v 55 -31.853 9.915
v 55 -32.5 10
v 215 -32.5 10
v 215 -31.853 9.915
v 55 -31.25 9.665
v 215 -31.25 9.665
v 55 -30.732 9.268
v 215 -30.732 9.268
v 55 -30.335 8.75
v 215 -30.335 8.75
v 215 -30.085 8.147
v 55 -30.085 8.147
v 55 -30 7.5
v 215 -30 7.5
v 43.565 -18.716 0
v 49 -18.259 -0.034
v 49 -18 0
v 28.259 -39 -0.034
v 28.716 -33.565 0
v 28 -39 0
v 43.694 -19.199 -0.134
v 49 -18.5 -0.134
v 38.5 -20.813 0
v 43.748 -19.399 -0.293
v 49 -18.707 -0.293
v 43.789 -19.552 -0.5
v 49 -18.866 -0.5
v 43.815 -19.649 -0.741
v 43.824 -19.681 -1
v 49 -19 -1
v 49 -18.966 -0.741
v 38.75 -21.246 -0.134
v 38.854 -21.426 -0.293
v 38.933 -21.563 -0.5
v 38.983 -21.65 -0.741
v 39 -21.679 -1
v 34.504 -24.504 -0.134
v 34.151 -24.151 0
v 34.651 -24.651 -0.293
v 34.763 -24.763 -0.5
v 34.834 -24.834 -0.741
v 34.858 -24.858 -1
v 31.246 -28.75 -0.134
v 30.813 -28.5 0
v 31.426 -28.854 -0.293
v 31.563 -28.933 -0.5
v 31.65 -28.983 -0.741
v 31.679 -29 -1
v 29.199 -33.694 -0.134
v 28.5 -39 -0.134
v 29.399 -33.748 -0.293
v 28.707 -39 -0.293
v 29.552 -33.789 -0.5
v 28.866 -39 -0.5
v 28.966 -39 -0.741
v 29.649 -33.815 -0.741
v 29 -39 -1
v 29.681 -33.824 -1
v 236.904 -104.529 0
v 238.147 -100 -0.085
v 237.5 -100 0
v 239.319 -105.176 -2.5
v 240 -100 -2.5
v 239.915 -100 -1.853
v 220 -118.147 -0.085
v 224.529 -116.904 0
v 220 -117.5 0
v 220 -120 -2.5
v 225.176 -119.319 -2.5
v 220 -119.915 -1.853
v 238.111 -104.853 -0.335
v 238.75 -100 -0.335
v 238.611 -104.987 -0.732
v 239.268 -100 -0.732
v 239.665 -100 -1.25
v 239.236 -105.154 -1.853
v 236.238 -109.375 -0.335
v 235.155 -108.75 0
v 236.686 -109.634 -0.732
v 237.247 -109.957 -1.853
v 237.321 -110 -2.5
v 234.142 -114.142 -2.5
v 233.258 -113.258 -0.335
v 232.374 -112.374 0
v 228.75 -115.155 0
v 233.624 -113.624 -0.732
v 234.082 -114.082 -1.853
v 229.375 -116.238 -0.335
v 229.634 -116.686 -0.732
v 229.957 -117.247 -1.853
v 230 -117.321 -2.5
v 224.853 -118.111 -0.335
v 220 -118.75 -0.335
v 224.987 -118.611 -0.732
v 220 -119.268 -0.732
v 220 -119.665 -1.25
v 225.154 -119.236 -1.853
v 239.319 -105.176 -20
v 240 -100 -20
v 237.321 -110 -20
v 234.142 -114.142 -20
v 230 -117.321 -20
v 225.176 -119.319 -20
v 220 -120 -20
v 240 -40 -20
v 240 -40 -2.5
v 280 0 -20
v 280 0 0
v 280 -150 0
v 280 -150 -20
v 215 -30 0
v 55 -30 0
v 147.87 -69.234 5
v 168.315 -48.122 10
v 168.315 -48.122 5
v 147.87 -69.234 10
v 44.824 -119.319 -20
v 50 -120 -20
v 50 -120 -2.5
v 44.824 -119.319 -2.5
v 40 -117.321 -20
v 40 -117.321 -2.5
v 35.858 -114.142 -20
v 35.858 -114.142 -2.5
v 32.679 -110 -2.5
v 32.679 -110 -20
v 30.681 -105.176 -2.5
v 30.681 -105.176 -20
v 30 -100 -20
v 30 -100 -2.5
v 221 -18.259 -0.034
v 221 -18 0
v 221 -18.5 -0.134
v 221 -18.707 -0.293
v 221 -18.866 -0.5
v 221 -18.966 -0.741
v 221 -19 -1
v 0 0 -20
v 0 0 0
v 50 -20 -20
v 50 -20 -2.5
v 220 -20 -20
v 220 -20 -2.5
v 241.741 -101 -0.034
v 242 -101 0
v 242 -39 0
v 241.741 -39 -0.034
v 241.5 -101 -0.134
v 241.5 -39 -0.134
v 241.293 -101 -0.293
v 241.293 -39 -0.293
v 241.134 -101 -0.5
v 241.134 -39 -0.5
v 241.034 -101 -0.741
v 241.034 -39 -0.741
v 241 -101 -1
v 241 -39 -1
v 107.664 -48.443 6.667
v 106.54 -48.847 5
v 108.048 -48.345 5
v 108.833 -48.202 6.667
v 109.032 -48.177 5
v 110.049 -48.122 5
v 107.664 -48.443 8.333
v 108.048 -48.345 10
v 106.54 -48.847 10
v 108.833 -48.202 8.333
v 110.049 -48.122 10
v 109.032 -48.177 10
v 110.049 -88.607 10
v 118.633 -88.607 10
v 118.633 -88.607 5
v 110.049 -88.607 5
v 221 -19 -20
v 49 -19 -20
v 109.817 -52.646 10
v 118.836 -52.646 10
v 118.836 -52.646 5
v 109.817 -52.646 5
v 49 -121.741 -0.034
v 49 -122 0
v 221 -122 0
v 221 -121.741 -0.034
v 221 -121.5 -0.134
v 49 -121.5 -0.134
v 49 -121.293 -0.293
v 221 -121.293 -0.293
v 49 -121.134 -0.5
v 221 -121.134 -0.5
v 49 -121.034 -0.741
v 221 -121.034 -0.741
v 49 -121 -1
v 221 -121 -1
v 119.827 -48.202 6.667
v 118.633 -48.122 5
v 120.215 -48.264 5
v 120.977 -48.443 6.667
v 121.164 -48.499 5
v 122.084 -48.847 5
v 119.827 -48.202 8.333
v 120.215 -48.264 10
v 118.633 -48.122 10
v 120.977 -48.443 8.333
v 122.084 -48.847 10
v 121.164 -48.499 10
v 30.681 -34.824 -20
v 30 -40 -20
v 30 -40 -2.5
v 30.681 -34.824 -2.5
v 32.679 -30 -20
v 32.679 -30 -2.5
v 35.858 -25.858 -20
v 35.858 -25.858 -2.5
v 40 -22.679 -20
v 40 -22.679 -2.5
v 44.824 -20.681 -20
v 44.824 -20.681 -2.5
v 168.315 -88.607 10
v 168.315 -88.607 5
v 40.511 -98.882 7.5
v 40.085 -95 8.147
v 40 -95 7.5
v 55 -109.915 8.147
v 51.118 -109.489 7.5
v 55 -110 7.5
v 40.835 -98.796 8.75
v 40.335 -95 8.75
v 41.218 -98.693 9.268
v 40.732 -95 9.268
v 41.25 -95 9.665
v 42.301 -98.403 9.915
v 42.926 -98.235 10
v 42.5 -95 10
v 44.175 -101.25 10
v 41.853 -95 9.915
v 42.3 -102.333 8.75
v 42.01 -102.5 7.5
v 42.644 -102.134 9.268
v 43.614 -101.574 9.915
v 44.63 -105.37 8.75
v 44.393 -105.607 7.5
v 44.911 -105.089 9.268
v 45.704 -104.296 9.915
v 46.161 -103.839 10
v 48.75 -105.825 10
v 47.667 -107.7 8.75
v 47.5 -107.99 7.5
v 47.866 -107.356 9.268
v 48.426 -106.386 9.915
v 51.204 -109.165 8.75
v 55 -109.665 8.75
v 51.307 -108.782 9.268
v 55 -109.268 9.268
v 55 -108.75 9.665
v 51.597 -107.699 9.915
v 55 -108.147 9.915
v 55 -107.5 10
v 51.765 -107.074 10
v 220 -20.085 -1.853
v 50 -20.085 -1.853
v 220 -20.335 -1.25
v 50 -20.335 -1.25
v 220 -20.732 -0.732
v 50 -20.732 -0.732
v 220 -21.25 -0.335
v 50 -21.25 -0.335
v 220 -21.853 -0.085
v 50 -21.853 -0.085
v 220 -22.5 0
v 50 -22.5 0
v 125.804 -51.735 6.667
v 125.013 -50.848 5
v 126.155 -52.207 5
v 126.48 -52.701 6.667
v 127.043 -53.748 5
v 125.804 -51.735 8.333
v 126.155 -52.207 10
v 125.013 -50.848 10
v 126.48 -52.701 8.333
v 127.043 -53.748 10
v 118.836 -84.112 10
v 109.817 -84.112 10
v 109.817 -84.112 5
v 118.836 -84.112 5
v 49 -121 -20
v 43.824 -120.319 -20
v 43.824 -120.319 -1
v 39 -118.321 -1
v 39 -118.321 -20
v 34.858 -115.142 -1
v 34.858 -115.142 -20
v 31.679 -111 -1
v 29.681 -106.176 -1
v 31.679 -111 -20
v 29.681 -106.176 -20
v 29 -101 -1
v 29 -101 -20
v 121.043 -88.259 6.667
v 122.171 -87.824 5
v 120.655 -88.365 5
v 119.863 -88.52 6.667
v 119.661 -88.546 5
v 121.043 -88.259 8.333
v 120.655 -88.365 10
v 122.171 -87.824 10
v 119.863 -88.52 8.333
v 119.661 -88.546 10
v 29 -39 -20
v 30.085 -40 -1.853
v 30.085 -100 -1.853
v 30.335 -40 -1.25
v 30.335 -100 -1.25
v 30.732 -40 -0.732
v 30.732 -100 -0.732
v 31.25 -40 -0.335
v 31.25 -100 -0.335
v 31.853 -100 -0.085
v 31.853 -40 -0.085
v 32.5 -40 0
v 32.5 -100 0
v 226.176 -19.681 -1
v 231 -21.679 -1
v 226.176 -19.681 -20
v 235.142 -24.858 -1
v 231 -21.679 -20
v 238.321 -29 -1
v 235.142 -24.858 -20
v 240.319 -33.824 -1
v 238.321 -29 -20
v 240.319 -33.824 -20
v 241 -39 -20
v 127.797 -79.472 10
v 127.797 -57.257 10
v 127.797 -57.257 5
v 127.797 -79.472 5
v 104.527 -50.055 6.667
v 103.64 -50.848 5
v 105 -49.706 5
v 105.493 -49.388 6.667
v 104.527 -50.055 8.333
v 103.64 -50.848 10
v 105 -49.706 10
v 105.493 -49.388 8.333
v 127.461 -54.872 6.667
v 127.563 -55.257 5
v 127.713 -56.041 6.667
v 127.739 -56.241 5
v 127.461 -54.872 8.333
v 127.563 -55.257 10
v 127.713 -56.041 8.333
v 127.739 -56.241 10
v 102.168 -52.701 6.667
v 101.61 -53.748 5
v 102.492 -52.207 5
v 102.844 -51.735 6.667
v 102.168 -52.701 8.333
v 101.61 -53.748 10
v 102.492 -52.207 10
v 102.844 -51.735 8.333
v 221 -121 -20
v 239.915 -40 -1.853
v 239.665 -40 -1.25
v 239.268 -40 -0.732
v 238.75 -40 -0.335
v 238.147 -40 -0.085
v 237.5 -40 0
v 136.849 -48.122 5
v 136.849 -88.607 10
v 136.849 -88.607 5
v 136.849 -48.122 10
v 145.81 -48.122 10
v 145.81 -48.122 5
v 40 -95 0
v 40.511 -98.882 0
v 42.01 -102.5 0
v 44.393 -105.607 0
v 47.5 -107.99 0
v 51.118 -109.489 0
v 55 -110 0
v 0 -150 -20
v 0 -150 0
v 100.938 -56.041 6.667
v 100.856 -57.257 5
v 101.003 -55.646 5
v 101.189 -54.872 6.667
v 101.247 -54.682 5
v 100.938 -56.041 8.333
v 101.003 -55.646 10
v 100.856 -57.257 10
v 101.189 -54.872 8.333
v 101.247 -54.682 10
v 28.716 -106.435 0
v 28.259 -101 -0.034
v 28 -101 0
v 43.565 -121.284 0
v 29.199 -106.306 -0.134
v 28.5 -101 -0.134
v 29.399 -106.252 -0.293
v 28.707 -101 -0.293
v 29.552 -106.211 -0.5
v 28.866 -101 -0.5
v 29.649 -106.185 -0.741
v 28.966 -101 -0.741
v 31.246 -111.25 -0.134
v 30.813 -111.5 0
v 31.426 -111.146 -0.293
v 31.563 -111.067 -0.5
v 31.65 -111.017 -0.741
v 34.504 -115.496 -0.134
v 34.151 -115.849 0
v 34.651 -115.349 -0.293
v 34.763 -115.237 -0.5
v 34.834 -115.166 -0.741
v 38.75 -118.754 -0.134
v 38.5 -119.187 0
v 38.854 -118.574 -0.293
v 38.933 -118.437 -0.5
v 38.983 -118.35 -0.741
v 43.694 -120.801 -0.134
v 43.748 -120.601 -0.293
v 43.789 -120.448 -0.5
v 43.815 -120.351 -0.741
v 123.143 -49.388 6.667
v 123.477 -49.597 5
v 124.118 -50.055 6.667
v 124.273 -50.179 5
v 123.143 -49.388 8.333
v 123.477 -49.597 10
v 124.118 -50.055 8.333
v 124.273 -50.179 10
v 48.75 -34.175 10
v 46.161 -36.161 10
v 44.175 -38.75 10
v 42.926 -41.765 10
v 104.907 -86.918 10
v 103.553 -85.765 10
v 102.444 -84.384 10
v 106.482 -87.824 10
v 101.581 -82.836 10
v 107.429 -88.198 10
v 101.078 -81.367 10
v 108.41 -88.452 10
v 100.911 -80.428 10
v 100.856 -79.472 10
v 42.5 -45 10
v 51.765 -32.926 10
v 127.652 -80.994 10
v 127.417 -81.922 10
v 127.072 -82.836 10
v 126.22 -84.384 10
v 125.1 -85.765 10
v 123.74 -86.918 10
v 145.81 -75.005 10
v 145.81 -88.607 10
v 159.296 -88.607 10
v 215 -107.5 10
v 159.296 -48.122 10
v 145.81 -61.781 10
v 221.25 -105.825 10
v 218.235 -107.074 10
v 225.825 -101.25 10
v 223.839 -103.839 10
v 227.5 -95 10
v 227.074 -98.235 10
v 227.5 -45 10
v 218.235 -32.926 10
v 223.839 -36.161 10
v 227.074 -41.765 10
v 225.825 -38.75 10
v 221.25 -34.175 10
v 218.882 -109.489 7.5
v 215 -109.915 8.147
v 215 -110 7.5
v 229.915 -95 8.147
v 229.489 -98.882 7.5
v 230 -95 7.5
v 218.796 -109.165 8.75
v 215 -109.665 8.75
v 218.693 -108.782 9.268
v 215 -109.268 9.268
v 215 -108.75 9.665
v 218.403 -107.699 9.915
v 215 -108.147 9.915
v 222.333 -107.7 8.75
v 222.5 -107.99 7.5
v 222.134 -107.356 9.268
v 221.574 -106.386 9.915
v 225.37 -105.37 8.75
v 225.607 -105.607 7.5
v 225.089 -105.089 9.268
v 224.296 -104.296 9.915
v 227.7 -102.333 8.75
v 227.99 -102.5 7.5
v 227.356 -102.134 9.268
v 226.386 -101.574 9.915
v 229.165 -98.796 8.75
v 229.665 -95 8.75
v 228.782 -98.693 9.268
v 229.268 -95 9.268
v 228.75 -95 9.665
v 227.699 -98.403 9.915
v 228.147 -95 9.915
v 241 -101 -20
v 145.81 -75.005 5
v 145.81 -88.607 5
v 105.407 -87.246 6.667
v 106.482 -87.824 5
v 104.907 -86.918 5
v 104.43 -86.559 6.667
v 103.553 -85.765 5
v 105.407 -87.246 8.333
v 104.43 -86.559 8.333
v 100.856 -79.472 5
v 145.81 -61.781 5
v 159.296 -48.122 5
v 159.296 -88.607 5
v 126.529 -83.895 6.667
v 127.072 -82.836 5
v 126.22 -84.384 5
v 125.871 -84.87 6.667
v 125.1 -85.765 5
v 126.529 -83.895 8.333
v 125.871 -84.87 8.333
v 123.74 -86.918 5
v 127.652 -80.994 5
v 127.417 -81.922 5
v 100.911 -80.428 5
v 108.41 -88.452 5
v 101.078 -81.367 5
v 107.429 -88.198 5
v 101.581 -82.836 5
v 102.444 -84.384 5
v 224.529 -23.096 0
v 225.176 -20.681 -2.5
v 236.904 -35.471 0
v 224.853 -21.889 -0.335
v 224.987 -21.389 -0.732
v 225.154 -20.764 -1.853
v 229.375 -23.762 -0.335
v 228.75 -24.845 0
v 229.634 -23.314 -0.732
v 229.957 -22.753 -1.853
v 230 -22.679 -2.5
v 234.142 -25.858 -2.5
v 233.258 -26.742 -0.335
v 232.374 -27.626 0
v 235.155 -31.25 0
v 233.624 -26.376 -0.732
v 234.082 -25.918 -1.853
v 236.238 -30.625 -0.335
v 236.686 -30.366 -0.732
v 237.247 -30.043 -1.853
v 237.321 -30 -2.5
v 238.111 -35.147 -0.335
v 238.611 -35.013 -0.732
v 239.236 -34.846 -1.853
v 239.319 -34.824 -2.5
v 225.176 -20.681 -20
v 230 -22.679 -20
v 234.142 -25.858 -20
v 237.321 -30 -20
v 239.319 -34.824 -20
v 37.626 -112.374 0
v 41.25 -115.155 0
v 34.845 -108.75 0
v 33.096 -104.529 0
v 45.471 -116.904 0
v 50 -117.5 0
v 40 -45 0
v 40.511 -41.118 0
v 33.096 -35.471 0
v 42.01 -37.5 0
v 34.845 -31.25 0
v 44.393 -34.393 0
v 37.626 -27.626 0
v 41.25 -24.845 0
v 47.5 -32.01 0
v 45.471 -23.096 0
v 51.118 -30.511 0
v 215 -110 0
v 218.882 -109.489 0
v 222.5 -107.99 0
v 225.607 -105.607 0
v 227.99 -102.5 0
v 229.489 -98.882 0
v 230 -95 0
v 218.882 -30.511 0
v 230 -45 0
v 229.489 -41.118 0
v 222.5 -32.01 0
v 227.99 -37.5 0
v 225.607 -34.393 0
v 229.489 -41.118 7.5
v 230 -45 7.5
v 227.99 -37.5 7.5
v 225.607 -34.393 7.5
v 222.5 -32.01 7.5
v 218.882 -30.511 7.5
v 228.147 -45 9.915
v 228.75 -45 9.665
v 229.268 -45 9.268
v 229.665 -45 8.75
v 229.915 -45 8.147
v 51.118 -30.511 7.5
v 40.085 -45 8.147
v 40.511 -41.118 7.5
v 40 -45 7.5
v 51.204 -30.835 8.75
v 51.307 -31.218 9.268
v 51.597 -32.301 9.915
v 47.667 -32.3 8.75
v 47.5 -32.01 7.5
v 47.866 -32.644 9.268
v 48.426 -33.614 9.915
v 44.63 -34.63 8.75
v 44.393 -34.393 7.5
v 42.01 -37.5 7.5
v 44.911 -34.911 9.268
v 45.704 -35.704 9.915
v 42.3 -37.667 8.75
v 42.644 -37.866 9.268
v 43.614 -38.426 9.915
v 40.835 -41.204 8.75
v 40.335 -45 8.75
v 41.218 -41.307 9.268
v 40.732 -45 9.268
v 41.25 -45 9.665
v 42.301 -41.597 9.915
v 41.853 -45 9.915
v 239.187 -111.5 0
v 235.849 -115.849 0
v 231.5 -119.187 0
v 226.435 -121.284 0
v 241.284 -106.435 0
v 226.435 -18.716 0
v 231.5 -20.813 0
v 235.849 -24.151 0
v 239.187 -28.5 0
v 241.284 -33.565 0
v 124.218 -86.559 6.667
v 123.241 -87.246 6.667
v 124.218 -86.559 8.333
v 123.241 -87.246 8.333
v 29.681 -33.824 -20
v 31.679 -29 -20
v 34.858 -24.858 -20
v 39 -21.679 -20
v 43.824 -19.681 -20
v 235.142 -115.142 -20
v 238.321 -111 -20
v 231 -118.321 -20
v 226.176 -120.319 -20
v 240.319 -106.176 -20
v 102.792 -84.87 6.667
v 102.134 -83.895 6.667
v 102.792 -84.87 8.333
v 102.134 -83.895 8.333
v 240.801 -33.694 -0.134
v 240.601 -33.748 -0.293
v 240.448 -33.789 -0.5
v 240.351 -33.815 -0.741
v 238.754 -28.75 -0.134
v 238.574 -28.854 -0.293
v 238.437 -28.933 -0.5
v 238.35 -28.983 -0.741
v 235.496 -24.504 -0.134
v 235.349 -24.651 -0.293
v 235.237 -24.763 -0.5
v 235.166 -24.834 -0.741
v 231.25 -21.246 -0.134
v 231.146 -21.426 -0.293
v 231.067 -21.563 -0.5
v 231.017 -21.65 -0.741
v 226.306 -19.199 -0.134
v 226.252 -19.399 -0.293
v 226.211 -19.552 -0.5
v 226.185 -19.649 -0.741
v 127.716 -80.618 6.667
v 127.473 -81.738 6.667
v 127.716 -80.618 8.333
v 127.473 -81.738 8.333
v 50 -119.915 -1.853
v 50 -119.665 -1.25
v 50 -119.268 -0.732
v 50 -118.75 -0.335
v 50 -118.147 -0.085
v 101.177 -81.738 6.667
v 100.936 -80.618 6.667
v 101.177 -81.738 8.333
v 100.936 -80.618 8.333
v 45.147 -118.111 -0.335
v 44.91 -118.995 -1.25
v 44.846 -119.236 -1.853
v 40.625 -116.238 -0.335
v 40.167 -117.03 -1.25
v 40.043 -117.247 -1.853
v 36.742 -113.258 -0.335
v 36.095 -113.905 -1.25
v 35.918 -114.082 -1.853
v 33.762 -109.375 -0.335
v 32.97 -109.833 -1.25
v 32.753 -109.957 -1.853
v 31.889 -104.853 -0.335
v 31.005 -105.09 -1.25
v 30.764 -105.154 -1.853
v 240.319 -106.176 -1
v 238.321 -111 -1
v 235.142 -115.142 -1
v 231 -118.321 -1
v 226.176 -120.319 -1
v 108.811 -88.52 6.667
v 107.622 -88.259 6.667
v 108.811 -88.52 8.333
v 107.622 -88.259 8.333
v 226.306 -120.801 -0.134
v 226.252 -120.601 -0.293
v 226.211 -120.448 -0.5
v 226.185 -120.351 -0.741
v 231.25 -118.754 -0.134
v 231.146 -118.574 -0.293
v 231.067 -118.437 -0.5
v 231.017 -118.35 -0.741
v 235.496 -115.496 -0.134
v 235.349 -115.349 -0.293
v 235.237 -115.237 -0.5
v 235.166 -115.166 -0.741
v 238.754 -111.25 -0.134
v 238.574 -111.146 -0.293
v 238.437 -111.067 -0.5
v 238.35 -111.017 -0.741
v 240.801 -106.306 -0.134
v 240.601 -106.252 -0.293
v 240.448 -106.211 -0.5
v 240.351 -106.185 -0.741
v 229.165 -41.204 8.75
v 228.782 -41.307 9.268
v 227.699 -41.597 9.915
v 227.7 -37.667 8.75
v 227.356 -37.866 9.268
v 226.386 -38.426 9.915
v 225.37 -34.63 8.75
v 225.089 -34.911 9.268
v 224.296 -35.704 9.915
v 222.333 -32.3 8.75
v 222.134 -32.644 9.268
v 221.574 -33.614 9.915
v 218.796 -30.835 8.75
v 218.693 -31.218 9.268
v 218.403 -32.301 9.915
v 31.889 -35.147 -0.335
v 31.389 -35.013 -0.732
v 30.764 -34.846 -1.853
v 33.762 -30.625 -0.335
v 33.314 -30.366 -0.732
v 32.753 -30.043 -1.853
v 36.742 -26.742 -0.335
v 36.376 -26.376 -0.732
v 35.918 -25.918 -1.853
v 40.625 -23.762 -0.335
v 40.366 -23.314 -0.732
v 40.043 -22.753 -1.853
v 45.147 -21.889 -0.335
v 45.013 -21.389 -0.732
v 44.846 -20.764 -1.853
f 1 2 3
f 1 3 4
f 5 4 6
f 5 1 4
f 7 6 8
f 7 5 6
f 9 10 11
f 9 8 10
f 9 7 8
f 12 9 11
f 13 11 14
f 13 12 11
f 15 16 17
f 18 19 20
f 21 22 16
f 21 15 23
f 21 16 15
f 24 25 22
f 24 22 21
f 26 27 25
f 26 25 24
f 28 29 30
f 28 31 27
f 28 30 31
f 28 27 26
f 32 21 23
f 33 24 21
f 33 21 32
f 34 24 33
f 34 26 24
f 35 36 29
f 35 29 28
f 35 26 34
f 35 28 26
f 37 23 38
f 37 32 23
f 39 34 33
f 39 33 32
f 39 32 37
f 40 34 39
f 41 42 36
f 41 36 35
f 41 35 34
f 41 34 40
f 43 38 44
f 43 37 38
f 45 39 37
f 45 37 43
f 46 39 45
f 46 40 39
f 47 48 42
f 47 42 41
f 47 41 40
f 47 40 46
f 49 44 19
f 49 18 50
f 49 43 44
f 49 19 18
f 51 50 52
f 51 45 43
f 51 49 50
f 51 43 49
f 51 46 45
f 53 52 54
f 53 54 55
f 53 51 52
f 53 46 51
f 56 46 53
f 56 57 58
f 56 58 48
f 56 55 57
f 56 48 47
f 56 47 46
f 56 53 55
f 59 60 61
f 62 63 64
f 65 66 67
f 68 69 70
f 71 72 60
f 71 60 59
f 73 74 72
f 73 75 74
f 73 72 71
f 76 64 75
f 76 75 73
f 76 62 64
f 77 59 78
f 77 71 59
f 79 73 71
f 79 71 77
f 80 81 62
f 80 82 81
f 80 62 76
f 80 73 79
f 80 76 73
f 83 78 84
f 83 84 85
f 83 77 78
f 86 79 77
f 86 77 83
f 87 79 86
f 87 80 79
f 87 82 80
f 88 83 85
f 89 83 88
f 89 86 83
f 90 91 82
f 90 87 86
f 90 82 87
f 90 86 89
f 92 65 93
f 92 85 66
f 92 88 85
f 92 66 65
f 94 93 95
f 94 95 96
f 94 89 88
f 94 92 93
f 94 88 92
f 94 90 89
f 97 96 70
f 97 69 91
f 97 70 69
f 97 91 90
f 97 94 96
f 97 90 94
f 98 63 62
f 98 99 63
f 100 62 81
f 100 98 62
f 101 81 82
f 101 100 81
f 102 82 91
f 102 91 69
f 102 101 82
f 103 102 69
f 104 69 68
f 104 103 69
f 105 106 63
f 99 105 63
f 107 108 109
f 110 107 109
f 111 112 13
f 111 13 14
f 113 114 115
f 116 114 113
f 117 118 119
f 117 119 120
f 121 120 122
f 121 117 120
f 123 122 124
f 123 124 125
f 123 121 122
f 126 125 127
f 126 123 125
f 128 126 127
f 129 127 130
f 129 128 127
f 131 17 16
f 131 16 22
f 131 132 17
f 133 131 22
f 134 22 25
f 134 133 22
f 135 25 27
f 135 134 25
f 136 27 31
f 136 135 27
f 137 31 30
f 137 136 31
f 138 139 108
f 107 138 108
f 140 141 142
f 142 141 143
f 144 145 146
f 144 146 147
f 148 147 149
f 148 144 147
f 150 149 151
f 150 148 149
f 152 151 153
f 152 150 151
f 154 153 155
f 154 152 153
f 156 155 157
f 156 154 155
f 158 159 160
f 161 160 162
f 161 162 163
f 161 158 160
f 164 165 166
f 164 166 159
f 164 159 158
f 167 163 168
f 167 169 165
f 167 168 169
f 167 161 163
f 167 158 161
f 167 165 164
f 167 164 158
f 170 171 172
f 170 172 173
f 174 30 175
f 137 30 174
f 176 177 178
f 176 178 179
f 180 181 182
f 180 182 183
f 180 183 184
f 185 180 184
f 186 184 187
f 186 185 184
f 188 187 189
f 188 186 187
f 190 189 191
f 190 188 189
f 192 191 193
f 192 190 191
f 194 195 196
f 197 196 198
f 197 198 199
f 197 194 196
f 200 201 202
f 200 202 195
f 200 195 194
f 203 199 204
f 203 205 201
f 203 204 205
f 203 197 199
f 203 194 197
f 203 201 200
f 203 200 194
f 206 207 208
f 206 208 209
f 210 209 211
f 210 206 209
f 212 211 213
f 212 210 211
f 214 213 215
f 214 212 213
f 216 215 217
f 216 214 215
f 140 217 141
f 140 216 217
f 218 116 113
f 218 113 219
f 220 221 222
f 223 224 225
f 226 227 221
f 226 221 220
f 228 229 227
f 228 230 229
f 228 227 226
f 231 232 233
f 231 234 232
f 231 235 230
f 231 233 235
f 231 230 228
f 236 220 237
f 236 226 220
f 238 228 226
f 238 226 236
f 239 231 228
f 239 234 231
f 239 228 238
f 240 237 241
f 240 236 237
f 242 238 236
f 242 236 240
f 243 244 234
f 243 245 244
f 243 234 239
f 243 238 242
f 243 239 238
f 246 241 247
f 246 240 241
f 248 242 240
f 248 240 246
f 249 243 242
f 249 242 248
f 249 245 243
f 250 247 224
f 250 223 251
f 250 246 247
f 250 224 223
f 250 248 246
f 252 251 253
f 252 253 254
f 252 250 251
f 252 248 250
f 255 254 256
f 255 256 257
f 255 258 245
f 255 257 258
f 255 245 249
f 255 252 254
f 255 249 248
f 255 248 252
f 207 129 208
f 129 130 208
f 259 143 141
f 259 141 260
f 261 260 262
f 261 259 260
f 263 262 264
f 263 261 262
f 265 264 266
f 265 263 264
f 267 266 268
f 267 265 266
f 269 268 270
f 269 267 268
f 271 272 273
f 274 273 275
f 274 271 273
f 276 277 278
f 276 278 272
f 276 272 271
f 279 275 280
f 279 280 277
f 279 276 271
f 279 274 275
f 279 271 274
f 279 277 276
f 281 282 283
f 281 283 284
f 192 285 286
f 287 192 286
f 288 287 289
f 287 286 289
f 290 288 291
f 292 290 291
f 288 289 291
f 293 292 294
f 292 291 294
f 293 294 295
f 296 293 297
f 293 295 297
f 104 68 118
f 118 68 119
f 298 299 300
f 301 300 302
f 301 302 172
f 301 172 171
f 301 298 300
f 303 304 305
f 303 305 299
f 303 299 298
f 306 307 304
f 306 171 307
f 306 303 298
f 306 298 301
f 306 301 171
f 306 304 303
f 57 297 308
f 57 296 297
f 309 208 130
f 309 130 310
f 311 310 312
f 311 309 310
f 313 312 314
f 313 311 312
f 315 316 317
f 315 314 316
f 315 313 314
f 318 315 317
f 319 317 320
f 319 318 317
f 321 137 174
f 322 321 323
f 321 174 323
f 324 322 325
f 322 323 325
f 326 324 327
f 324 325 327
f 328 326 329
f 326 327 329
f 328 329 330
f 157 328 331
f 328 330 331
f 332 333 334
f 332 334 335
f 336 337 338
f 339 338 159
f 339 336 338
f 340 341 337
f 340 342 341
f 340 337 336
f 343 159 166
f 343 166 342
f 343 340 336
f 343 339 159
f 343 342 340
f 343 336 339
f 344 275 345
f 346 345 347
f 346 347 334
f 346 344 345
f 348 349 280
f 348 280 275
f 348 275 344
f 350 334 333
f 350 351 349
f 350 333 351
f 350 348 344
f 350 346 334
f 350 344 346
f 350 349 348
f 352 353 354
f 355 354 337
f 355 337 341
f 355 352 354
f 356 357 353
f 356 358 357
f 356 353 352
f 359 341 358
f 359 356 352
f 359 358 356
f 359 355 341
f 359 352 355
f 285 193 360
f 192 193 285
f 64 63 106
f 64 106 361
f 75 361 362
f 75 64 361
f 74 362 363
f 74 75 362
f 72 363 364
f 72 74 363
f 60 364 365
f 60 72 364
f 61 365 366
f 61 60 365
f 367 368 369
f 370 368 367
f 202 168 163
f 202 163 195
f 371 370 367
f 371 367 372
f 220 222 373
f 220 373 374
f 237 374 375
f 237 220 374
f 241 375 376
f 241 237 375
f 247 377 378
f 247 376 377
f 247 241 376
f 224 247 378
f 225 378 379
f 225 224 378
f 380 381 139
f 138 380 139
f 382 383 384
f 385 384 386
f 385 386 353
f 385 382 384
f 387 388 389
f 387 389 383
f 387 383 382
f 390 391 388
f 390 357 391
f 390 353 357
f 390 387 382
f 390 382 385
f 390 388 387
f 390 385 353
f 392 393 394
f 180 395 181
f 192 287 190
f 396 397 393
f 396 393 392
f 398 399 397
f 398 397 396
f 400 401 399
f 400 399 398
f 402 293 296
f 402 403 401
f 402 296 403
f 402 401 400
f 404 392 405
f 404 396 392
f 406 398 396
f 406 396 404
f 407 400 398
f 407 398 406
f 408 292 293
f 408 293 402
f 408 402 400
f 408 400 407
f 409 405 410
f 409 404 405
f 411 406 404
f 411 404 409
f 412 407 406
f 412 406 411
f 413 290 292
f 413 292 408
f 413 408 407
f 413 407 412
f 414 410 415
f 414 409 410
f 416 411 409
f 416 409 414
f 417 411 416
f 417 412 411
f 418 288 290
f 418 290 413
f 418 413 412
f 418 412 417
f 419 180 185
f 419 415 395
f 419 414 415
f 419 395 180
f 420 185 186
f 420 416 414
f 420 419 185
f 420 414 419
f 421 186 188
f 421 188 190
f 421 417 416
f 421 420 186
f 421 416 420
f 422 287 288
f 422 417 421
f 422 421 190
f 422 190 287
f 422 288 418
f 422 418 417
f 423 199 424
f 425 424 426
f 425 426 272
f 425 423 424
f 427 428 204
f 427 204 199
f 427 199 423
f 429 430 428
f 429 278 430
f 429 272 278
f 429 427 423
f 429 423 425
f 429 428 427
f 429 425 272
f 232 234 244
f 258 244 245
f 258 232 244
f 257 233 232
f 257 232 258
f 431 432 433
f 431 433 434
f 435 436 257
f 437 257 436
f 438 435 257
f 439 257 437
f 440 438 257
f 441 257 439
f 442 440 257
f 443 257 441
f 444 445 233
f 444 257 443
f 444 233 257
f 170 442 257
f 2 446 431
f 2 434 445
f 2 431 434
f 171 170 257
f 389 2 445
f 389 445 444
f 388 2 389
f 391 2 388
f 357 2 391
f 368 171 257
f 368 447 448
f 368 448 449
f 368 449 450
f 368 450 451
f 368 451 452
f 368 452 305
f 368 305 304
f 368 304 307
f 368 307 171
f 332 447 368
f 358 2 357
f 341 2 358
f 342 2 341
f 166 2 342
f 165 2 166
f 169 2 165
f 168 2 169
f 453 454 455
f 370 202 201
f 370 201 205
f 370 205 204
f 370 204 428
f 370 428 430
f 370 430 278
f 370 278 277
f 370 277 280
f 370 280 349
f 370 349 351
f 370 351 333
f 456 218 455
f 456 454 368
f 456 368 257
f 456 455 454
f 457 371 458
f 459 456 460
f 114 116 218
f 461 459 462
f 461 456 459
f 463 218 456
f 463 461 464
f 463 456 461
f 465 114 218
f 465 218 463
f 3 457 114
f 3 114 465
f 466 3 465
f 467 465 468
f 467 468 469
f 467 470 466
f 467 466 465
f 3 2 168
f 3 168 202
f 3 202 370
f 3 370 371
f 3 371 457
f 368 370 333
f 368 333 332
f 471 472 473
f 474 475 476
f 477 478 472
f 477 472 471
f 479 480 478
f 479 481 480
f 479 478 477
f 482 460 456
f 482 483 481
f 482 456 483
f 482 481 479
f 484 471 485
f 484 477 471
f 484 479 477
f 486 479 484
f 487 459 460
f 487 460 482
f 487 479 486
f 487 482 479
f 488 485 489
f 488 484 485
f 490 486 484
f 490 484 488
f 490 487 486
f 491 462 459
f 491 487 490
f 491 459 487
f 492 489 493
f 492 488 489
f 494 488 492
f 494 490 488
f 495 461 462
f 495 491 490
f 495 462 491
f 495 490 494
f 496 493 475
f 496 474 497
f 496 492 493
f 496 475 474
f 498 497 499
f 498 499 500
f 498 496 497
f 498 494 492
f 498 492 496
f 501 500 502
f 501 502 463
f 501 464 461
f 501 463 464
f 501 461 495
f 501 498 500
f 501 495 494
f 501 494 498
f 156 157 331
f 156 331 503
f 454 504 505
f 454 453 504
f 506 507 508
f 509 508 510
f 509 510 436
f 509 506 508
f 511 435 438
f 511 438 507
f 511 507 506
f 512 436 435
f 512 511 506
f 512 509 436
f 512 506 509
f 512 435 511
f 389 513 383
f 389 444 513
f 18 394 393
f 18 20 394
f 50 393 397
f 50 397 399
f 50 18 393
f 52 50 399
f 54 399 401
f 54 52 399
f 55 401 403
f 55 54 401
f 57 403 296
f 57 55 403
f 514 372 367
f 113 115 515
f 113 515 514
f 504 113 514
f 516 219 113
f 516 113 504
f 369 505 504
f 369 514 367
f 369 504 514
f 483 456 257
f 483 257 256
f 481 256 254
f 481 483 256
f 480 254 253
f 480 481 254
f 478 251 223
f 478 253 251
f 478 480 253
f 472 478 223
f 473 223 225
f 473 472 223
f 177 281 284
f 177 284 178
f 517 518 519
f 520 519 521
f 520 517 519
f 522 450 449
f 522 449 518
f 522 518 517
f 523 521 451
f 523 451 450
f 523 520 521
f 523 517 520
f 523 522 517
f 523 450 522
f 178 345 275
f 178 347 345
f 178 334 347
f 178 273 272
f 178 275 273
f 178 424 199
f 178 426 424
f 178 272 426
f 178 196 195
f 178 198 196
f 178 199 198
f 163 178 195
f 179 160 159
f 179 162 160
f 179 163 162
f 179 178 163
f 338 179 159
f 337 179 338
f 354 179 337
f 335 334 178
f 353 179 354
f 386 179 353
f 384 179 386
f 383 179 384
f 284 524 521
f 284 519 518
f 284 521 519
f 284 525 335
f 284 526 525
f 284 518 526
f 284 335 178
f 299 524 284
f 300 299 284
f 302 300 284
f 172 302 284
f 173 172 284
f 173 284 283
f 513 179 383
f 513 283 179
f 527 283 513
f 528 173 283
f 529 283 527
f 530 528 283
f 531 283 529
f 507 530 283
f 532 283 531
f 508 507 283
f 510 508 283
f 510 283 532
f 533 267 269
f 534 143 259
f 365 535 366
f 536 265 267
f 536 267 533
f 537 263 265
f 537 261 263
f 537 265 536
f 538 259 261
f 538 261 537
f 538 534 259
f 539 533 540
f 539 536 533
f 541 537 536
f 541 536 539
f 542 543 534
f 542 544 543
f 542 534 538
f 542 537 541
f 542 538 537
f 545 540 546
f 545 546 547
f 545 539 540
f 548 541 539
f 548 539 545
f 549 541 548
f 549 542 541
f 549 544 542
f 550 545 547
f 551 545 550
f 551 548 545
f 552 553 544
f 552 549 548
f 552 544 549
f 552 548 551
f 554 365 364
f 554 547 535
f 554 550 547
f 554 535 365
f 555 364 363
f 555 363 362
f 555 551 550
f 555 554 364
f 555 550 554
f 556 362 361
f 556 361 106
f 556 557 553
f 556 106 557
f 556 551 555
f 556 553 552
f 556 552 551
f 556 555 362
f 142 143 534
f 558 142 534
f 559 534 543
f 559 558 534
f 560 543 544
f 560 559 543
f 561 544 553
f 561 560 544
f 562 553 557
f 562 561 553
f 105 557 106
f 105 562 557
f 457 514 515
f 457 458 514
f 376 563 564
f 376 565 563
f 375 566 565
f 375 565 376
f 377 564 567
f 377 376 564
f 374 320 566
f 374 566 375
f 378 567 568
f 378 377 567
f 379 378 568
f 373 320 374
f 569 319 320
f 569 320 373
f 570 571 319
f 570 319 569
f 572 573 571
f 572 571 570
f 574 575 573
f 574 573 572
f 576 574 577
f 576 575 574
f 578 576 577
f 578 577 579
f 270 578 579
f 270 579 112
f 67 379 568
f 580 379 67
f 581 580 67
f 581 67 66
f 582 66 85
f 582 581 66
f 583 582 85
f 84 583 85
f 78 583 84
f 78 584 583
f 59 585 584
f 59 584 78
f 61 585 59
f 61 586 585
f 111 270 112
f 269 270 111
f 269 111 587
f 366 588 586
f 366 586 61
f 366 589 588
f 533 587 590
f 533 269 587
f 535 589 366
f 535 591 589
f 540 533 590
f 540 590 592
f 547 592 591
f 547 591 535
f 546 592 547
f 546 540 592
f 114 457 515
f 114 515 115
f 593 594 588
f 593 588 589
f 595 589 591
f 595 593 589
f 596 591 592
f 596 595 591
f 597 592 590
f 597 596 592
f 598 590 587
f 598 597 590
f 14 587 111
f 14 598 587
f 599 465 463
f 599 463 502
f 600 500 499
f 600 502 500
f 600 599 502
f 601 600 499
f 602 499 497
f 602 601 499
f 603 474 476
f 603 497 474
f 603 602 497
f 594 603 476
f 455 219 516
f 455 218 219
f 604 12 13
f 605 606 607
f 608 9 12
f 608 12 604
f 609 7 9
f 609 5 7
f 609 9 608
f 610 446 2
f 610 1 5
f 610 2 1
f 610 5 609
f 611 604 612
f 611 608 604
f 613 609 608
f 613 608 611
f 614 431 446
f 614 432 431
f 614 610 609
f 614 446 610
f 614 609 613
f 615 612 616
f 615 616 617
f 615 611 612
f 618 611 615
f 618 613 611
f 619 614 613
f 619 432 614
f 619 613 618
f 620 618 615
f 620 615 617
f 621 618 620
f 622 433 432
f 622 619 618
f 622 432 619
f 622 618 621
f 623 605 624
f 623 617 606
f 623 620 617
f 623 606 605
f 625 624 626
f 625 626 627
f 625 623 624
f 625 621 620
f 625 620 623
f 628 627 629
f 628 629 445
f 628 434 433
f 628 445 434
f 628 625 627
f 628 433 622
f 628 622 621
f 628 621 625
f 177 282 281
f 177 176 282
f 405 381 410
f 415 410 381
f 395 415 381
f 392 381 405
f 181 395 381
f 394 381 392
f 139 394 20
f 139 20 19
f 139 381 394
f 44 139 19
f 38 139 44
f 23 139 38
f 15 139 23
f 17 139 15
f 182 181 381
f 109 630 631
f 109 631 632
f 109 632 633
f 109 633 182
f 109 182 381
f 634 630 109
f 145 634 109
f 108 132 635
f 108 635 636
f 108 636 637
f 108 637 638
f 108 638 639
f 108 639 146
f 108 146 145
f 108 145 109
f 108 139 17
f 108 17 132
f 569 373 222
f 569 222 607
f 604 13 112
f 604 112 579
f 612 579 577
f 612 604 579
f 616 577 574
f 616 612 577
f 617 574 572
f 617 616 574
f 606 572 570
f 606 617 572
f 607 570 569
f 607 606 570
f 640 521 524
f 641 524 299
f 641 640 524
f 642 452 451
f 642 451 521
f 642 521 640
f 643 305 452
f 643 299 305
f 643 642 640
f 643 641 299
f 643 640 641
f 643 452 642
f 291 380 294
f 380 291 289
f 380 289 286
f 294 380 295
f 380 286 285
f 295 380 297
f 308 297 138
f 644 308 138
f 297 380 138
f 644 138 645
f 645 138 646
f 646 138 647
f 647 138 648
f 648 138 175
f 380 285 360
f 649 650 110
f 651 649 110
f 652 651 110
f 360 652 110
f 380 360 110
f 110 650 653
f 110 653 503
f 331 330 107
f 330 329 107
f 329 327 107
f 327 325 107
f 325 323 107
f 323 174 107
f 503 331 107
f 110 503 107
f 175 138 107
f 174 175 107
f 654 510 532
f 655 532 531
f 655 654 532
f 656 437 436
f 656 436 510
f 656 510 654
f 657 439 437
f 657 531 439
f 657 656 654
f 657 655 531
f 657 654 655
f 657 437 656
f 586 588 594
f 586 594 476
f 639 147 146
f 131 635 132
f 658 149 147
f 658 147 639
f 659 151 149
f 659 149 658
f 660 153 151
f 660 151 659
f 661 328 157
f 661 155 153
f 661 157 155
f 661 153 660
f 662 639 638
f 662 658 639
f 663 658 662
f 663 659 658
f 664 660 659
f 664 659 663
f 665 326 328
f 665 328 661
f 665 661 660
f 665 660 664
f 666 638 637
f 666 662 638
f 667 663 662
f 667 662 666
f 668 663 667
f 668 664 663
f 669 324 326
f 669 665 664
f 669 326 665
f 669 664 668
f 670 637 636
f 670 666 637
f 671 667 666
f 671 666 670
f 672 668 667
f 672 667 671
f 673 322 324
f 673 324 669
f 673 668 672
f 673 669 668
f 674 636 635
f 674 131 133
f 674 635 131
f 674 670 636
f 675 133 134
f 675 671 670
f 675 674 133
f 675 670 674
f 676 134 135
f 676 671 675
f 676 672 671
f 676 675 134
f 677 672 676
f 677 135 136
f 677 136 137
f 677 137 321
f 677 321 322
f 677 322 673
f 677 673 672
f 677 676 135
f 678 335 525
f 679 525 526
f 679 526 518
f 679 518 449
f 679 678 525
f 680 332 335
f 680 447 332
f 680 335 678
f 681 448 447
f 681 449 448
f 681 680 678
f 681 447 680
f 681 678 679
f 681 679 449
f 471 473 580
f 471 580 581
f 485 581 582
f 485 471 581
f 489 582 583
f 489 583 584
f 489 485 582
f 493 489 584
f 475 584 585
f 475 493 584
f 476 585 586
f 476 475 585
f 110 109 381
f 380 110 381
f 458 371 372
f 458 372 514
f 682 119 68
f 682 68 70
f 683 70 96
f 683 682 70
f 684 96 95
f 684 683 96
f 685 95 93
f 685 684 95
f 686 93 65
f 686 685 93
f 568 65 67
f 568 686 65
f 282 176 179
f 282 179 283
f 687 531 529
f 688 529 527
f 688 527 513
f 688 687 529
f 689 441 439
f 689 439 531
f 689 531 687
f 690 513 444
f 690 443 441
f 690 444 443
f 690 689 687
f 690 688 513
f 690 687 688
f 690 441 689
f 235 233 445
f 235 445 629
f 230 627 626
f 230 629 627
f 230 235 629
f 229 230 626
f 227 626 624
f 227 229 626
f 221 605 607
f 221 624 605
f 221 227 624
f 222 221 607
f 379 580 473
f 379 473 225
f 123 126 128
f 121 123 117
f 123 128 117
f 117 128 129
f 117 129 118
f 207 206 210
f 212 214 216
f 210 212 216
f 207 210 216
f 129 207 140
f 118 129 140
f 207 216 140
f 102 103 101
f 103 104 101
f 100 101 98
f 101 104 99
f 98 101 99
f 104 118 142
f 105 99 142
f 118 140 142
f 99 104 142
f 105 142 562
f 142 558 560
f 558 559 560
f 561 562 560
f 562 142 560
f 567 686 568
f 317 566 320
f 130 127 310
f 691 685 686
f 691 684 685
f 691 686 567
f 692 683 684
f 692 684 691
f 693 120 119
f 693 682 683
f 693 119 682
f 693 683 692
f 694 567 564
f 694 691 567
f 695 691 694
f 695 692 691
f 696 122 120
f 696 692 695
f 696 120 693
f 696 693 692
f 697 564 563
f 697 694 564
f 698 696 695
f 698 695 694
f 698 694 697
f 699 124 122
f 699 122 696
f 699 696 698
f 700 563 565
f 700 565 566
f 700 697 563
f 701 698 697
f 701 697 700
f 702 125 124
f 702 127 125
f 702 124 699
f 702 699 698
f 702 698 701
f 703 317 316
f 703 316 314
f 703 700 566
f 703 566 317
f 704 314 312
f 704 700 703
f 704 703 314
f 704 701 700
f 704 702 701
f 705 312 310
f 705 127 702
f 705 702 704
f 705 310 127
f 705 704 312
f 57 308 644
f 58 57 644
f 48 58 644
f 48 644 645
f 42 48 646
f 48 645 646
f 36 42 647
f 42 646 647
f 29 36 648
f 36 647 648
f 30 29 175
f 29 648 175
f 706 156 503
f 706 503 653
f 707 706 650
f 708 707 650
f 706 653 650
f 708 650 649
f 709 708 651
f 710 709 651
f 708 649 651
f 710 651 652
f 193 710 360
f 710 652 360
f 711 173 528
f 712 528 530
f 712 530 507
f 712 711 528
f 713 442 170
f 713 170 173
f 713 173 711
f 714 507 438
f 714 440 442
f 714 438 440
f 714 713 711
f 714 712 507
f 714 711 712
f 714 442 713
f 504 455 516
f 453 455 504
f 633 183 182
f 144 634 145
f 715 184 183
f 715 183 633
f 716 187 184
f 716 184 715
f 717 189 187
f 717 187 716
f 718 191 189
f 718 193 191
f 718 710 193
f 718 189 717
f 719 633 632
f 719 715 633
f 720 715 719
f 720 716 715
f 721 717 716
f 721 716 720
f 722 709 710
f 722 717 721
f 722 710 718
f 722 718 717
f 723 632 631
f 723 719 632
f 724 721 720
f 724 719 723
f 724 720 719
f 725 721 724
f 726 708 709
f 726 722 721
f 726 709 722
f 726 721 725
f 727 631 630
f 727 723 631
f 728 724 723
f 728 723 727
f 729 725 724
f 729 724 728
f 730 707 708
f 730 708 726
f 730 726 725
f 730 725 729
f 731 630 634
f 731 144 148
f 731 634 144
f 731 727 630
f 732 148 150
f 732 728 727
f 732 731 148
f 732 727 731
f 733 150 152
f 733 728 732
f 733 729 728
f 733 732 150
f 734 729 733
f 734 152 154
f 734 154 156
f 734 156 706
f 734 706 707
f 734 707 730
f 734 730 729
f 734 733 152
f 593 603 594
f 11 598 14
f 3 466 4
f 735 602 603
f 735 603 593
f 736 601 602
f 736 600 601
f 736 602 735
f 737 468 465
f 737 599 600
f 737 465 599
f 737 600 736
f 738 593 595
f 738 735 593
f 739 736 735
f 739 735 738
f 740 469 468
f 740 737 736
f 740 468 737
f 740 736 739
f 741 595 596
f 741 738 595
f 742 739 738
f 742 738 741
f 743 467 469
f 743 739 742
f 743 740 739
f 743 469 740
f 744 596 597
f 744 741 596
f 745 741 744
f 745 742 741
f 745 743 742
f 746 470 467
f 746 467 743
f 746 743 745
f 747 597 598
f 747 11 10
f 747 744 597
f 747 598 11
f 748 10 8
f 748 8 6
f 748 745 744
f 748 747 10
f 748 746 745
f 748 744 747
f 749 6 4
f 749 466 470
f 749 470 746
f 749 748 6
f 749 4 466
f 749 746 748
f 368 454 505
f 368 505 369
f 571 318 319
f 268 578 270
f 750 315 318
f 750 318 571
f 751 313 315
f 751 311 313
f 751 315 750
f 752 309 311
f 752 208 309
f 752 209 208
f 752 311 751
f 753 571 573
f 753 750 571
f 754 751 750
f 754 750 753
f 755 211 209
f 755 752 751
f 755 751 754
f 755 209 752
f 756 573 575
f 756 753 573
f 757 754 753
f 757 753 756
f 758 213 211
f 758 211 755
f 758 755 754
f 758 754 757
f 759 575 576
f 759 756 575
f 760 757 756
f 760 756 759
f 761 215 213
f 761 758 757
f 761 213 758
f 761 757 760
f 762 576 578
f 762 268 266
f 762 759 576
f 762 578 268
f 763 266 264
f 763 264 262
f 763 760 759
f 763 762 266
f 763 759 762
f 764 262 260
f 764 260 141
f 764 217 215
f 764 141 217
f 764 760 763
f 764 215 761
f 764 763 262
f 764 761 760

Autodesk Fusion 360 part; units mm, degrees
sketch "Sketch1" plane through (0, 0, 0) normal (0, 0, 1) x (1, 0, 0)
  line L0 (40, -30) -> (230, -30)
  line L1 (230, -30) -> (230, -110)
  line L2 (230, -110) -> (40, -110)
  line L3 (40, -110) -> (40, -30)
  line L4 (30, -20) -> (240, -20)
  line L5 (240, -20) -> (240, -120)
  line L6 (240, -120) -> (30, -120)
  line L7 (30, -120) -> (30, -20)
  line L8 (40, -30) -> (230, -110)
  line L9 (230, -30) -> (40, -110)
  line L10 (241, -121) -> (29, -121)
  line L11 (29, -121) -> (29, -19)
  line L12 (29, -19) -> (241, -19)
  line L13 (241, -19) -> (241, -121)
  line L14 (241, -121) -> (29, -19) construction
  line L15 (29, -121) -> (241, -19) construction
  line L16 (0, 0) -> (280, 0)
  line L17 (280, 0) -> (280, -150)
  line L18 (280, -150) -> (0, -150)
  line L19 (0, -150) -> (0, 0)
  point P0 (135, -70)
extrude "Extrude3" add sketch "Sketch1" against normal blind 20 contours L16 L17 L18 L19 makes body 1
extrude "Extrude1" add sketch "Sketch1" against normal blind 20 separate body contours L3 L8 L9 | L0 L8 L9 | L1 L8 L9 | L2 L8 L9 | L4 L5 L6 L7 makes body 2
extrude "Extrude2" add sketch "Sketch1" along normal blind 10 contours L3 L8 L9 | L0 L8 L9 | L1 L8 L9 | L2 L8 L9 bodies 2
fillet "Fillet1" radius 15 4 edges at (40, -110, 5) (40, -30, 5) (230, -30, 5) (230, -110, 5) on bodies 2
fillet "Fillet1" radius 20 4 edges at (30, -120, -10) (30, -20, -10) (240, -20, -10) (240, -120, -10) on bodies 2
fillet "Fillet2" radius 2.5 16 edges at (225.6066, -34.3934, 10) (135, -30, 10) (44.3934, -34.3934, 10) (40, -70, 10) (44.3934, -105.6066, 10) (135, -110, 10) (225.6066, -105.6066, 10) (230, -70, 10) (30, -70, 0) (35.8579, -25.8579, 0) (135, -20, 0) (234.1421, -25.8579, 0) (240, -70, 0) (234.1421, -114.1421, 0) (135, -120, 0) (35.8579, -114.1421, 0) on bodies 2
fillet "Fillet3" radius 20 4 edges at (29, -19, -10) (241, -19, -10) (241, -121, -10) (29, -121, -10) on bodies 1
fillet "Fillet4" radius 1 8 edges at (235.1421, -115.1421, 0) (241, -70, 0) (235.1421, -24.8579, 0) (135, -19, 0) (34.8579, -24.8579, 0) (29, -70, 0) (34.8579, -115.1421, 0) (135, -121, 0) on bodies 1
sketch "Sketch2" plane through (0, 0, 10) normal (0, 0, 1) x (-1, 0, 0)
  arc A0 (-227.5, 45) -> (-215, 32.5) centre (-215, 45) ccw
  line L0 (-215, 32.5) -> (-55, 32.5)
  arc A1 (-55, 32.5) -> (-42.5, 45) centre (-55, 45) ccw
  line L1 (-42.5, 45) -> (-42.5, 95)
  arc A2 (-42.5, 95) -> (-55, 107.5) centre (-55, 95) ccw
  line L2 (-55, 107.5) -> (-215, 107.5)
  arc A3 (-215, 107.5) -> (-227.5, 95) centre (-215, 95) ccw
  line L3 (-227.5, 95) -> (-227.5, 45)
  line L4 (-110.0488, 48.1218) -> (-118.633, 48.1218)
  spline S0 degree 3 poles (-118.633, 48.1218) (-119.851, 48.1218) (-120.9965, 48.3611) (-122.084, 48.8469) knots 0 0 0 0 1 1 1 1
  spline S1 degree 3 poles (-122.084, 48.8469) (-123.1861, 49.3254) (-124.1576, 49.9924) (-125.0131, 50.8479) knots 0 0 0 0 1 1 1 1
  spline S2 degree 3 poles (-125.0131, 50.8479) (-125.8614, 51.6962) (-126.5356, 52.6604) (-127.0431, 53.748) knots 0 0 0 0 1 1 1 1
  spline S3 degree 3 poles (-127.0431, 53.748) (-127.5434, 54.85) (-127.7972, 56.0173) (-127.7972, 57.257) knots 0 0 0 0 1 1 1 1
  line L5 (-127.7972, 57.257) -> (-127.7972, 79.4715)
  spline S4 degree 3 poles (-127.7972, 79.4715) (-127.7972, 80.6315) (-127.5507, 81.748) (-127.0722, 82.8356) knots 0 0 0 0 1 1 1 1
  spline S5 degree 3 poles (-127.0722, 82.8356) (-126.5864, 83.9376) (-125.9266, 84.9091) (-125.1001, 85.7646) knots 0 0 0 0 1 1 1 1
  spline S6 degree 3 poles (-125.1001, 85.7646) (-124.2663, 86.6129) (-123.2876, 87.3017) (-122.171, 87.8237) knots 0 0 0 0 1 1 1 1
  spline S7 degree 3 poles (-122.171, 87.8237) (-121.069, 88.3457) (-119.8873, 88.6067) (-118.633, 88.6067) knots 0 0 0 0 1 1 1 1
  line L6 (-118.633, 88.6067) -> (-110.0488, 88.6067)
  spline S8 degree 3 poles (-110.0488, 88.6067) (-108.7873, 88.6067) (-107.5982, 88.3457) (-106.4817, 87.8237) knots 0 0 0 0 1 1 1 1
  spline S9 degree 3 poles (-106.4817, 87.8237) (-105.358, 87.3017) (-104.3792, 86.6129) (-103.5527, 85.7646) knots 0 0 0 0 1 1 1 1
  spline S10 degree 3 poles (-103.5527, 85.7646) (-102.7406, 84.9091) (-102.0809, 83.9376) (-101.5806, 82.8356) knots 0 0 0 0 1 1 1 1
  spline S11 degree 3 poles (-101.5806, 82.8356) (-101.0949, 81.748) (-100.8556, 80.6315) (-100.8556, 79.4715) knots 0 0 0 0 1 1 1 1
  line L7 (-100.8556, 79.4715) -> (-100.8556, 57.257)
  spline S12 degree 3 poles (-100.8556, 57.257) (-100.8556, 56.0173) (-101.1021, 54.85) (-101.6096, 53.748) knots 0 0 0 0 1 1 1 1
  spline S13 degree 3 poles (-101.6096, 53.748) (-102.1099, 52.6604) (-102.7841, 51.6962) (-103.6397, 50.8479) knots 0 0 0 0 1 1 1 1
  spline S14 degree 3 poles (-103.6397, 50.8479) (-104.4879, 49.9924) (-105.4522, 49.3254) (-106.5397, 48.8469) knots 0 0 0 0 1 1 1 1
  spline S15 degree 3 poles (-106.5397, 48.8469) (-107.6417, 48.3611) (-108.809, 48.1218) (-110.0488, 48.1218) knots 0 0 0 0 1 1 1 1
  line L8 (-118.836, 52.6459) -> (-109.8168, 52.6459)
  line L9 (-109.8168, 52.6459) -> (-109.8168, 84.1116)
  line L10 (-109.8168, 84.1116) -> (-118.836, 84.1116)
  line L11 (-118.836, 84.1116) -> (-118.836, 52.6459)
  line L12 (-159.2957, 88.6067) -> (-145.8104, 75.0054)
  line L13 (-145.8104, 75.0054) -> (-145.8104, 88.6067)
  line L14 (-145.8104, 88.6067) -> (-136.8492, 88.6067)
  line L15 (-136.8492, 88.6067) -> (-136.8492, 48.1219)
  line L16 (-136.8492, 48.1219) -> (-145.8104, 48.1219)
  line L17 (-145.8104, 48.1219) -> (-145.8104, 61.7811)
  line L18 (-145.8104, 61.7811) -> (-159.2957, 48.1219)
  line L19 (-159.2957, 48.1219) -> (-168.3149, 48.1219)
  line L20 (-168.3149, 48.1219) -> (-147.8695, 69.2343)
  line L21 (-147.8695, 69.2343) -> (-168.3149, 88.6067)
  line L22 (-168.3149, 88.6067) -> (-159.2957, 88.6067)
extrude "Extrude4" cut sketch "Sketch2" against normal blind 5 contours L4 S0 S1 S2 S3 L5 S4 S5 S6 S7 L6 S8 S9 S10 S11 L7 S12 S13 S14 S15 | L12 L13 L14 L15 L16 L17 L18 L19 L20 L21 L22 bodies 2
